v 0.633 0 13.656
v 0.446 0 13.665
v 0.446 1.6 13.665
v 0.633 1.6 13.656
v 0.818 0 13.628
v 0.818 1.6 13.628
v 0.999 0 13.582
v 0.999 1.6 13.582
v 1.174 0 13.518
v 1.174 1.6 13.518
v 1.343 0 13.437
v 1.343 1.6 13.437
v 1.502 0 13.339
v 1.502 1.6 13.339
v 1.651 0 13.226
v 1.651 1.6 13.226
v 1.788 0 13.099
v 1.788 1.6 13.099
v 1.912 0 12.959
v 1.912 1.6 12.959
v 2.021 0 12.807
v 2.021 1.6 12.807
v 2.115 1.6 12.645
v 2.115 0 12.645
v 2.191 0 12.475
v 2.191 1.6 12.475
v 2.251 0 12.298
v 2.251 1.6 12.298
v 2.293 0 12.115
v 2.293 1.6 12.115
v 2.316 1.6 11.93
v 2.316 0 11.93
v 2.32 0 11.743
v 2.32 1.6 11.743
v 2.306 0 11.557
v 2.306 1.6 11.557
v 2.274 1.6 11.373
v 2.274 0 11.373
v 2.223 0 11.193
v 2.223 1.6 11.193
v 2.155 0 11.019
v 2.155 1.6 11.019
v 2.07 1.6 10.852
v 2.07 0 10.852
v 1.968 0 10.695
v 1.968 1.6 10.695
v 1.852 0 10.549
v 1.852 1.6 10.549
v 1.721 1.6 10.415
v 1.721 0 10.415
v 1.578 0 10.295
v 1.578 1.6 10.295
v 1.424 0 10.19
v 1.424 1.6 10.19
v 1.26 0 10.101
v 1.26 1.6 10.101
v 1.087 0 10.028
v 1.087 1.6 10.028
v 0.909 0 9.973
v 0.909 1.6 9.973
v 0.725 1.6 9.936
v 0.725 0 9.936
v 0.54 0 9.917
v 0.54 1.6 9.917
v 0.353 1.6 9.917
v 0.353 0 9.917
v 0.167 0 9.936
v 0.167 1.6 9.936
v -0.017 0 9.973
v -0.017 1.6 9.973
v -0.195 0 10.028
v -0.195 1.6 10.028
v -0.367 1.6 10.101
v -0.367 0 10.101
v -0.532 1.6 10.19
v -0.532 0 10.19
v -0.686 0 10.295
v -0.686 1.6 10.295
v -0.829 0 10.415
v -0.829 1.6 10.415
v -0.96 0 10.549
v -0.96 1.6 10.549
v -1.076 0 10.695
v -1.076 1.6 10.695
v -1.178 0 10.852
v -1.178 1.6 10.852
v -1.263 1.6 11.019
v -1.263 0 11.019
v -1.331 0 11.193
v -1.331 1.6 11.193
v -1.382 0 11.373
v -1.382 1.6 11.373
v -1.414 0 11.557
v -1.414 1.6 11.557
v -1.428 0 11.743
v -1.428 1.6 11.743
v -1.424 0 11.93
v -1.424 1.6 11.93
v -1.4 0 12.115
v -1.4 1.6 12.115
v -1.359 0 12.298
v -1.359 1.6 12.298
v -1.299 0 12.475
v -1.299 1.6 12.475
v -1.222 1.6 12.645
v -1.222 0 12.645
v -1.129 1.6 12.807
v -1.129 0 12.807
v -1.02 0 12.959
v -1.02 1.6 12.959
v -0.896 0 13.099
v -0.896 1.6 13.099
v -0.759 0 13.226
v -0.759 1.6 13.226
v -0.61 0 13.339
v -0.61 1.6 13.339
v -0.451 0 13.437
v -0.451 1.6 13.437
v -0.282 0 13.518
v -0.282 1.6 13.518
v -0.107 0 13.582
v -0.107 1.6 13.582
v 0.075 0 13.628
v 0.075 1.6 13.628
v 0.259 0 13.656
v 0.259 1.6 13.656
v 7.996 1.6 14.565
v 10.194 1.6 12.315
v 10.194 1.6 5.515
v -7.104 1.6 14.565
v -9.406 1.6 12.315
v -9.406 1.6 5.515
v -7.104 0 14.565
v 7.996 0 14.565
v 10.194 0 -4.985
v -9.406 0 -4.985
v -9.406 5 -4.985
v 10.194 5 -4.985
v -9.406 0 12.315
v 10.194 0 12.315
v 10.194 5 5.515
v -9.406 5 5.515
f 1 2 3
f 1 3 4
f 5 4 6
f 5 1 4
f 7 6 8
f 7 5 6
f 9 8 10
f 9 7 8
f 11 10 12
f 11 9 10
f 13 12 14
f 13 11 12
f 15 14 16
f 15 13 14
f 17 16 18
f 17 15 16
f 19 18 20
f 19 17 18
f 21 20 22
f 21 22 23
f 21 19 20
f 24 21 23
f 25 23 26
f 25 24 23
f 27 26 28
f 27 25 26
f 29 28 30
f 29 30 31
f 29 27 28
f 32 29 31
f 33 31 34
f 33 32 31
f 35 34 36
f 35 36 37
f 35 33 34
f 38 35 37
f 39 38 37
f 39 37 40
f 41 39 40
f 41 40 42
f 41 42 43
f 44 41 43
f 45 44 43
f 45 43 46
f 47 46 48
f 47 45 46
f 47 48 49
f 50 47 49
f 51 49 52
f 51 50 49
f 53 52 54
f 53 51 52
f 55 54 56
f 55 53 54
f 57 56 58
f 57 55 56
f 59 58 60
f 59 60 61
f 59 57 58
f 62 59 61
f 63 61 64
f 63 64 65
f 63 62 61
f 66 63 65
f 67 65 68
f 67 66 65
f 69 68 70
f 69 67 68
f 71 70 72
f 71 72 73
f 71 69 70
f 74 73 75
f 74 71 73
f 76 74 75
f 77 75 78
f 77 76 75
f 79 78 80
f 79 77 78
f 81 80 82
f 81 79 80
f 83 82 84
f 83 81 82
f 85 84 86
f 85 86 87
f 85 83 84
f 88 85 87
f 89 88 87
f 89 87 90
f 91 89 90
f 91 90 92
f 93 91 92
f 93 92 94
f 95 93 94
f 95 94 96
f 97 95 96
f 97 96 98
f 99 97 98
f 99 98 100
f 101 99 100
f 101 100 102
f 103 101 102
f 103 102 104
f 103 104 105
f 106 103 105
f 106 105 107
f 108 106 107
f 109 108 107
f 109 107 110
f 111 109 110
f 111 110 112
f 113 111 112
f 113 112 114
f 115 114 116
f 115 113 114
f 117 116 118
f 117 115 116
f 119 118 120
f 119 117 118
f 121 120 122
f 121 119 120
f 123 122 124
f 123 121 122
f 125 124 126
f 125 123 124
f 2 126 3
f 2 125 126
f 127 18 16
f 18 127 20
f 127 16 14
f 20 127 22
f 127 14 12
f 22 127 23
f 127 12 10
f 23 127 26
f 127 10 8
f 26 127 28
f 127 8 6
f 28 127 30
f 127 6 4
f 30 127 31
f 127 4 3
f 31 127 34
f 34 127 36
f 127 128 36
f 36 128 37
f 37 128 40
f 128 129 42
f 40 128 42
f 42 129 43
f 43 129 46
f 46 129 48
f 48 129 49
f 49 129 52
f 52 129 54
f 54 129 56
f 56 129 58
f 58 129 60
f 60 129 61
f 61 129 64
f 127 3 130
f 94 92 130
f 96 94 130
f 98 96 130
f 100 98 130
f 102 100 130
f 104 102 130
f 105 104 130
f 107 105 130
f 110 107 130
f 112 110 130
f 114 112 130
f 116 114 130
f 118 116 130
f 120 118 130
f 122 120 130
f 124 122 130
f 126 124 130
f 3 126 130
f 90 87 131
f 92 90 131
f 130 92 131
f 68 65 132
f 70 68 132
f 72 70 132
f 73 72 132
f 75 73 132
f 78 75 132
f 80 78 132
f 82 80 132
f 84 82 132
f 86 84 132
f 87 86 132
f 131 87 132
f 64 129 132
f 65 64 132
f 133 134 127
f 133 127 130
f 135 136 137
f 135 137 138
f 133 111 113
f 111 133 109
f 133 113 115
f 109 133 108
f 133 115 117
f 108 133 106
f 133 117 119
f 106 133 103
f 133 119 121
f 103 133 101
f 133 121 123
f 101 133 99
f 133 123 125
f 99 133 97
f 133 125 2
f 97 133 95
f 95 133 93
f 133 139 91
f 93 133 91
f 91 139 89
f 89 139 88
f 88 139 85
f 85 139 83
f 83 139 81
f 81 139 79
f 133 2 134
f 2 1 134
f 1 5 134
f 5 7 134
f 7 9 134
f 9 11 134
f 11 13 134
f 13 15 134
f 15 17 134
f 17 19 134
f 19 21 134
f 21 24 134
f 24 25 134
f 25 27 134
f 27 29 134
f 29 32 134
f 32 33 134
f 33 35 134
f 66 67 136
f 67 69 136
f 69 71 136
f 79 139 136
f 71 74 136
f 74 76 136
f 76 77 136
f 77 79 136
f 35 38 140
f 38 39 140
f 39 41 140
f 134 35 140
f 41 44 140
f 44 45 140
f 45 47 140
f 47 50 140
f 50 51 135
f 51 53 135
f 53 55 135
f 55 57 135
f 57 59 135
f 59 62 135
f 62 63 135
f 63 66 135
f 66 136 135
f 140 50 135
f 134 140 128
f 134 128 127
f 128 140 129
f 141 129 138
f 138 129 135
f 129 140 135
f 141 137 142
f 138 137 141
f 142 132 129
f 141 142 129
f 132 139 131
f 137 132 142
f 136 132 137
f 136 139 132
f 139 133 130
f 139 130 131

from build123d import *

# Parameters (mm, degrees)
SKETCH_1_R      = 1.875
EXTRUDE_1_DEPTH = 1.6
SKETCH_1_3_W    = 19.6
SKETCH_1_3_H    = 10.5
EXTRUDE_2_DEPTH = 5


with BuildPart() as part:
    # 草图1 → 凸台-拉伸1 (new body)
    with BuildSketch(Plane(origin=(0, 0, 0), x_dir=(1, 0, 0), z_dir=(0, 1, 0))):
        Polygon((-9.405761269, -5.514899143), (-9.405761269, -12.314899143), (-7.103957265, -14.564899143), (7.996042735, -14.564899143), (10.194238731, -12.314899143), (10.194238731, -5.514899143), align=None)
        with Locations((0.446042735, -11.789899143)):
            Circle(SKETCH_1_R, mode=Mode.SUBTRACT)
    extrude(amount=EXTRUDE_1_DEPTH)

    # 草图1<3> → 凸台-拉伸2 (add)
    with BuildSketch(Plane(origin=(0, 0, 0), x_dir=(1, 0, 0), z_dir=(0, 1, 0))):
        with Locations((0.394238731, -0.264899143)):
            Rectangle(SKETCH_1_3_W, SKETCH_1_3_H)
    extrude(amount=EXTRUDE_2_DEPTH)


solid = part.part
